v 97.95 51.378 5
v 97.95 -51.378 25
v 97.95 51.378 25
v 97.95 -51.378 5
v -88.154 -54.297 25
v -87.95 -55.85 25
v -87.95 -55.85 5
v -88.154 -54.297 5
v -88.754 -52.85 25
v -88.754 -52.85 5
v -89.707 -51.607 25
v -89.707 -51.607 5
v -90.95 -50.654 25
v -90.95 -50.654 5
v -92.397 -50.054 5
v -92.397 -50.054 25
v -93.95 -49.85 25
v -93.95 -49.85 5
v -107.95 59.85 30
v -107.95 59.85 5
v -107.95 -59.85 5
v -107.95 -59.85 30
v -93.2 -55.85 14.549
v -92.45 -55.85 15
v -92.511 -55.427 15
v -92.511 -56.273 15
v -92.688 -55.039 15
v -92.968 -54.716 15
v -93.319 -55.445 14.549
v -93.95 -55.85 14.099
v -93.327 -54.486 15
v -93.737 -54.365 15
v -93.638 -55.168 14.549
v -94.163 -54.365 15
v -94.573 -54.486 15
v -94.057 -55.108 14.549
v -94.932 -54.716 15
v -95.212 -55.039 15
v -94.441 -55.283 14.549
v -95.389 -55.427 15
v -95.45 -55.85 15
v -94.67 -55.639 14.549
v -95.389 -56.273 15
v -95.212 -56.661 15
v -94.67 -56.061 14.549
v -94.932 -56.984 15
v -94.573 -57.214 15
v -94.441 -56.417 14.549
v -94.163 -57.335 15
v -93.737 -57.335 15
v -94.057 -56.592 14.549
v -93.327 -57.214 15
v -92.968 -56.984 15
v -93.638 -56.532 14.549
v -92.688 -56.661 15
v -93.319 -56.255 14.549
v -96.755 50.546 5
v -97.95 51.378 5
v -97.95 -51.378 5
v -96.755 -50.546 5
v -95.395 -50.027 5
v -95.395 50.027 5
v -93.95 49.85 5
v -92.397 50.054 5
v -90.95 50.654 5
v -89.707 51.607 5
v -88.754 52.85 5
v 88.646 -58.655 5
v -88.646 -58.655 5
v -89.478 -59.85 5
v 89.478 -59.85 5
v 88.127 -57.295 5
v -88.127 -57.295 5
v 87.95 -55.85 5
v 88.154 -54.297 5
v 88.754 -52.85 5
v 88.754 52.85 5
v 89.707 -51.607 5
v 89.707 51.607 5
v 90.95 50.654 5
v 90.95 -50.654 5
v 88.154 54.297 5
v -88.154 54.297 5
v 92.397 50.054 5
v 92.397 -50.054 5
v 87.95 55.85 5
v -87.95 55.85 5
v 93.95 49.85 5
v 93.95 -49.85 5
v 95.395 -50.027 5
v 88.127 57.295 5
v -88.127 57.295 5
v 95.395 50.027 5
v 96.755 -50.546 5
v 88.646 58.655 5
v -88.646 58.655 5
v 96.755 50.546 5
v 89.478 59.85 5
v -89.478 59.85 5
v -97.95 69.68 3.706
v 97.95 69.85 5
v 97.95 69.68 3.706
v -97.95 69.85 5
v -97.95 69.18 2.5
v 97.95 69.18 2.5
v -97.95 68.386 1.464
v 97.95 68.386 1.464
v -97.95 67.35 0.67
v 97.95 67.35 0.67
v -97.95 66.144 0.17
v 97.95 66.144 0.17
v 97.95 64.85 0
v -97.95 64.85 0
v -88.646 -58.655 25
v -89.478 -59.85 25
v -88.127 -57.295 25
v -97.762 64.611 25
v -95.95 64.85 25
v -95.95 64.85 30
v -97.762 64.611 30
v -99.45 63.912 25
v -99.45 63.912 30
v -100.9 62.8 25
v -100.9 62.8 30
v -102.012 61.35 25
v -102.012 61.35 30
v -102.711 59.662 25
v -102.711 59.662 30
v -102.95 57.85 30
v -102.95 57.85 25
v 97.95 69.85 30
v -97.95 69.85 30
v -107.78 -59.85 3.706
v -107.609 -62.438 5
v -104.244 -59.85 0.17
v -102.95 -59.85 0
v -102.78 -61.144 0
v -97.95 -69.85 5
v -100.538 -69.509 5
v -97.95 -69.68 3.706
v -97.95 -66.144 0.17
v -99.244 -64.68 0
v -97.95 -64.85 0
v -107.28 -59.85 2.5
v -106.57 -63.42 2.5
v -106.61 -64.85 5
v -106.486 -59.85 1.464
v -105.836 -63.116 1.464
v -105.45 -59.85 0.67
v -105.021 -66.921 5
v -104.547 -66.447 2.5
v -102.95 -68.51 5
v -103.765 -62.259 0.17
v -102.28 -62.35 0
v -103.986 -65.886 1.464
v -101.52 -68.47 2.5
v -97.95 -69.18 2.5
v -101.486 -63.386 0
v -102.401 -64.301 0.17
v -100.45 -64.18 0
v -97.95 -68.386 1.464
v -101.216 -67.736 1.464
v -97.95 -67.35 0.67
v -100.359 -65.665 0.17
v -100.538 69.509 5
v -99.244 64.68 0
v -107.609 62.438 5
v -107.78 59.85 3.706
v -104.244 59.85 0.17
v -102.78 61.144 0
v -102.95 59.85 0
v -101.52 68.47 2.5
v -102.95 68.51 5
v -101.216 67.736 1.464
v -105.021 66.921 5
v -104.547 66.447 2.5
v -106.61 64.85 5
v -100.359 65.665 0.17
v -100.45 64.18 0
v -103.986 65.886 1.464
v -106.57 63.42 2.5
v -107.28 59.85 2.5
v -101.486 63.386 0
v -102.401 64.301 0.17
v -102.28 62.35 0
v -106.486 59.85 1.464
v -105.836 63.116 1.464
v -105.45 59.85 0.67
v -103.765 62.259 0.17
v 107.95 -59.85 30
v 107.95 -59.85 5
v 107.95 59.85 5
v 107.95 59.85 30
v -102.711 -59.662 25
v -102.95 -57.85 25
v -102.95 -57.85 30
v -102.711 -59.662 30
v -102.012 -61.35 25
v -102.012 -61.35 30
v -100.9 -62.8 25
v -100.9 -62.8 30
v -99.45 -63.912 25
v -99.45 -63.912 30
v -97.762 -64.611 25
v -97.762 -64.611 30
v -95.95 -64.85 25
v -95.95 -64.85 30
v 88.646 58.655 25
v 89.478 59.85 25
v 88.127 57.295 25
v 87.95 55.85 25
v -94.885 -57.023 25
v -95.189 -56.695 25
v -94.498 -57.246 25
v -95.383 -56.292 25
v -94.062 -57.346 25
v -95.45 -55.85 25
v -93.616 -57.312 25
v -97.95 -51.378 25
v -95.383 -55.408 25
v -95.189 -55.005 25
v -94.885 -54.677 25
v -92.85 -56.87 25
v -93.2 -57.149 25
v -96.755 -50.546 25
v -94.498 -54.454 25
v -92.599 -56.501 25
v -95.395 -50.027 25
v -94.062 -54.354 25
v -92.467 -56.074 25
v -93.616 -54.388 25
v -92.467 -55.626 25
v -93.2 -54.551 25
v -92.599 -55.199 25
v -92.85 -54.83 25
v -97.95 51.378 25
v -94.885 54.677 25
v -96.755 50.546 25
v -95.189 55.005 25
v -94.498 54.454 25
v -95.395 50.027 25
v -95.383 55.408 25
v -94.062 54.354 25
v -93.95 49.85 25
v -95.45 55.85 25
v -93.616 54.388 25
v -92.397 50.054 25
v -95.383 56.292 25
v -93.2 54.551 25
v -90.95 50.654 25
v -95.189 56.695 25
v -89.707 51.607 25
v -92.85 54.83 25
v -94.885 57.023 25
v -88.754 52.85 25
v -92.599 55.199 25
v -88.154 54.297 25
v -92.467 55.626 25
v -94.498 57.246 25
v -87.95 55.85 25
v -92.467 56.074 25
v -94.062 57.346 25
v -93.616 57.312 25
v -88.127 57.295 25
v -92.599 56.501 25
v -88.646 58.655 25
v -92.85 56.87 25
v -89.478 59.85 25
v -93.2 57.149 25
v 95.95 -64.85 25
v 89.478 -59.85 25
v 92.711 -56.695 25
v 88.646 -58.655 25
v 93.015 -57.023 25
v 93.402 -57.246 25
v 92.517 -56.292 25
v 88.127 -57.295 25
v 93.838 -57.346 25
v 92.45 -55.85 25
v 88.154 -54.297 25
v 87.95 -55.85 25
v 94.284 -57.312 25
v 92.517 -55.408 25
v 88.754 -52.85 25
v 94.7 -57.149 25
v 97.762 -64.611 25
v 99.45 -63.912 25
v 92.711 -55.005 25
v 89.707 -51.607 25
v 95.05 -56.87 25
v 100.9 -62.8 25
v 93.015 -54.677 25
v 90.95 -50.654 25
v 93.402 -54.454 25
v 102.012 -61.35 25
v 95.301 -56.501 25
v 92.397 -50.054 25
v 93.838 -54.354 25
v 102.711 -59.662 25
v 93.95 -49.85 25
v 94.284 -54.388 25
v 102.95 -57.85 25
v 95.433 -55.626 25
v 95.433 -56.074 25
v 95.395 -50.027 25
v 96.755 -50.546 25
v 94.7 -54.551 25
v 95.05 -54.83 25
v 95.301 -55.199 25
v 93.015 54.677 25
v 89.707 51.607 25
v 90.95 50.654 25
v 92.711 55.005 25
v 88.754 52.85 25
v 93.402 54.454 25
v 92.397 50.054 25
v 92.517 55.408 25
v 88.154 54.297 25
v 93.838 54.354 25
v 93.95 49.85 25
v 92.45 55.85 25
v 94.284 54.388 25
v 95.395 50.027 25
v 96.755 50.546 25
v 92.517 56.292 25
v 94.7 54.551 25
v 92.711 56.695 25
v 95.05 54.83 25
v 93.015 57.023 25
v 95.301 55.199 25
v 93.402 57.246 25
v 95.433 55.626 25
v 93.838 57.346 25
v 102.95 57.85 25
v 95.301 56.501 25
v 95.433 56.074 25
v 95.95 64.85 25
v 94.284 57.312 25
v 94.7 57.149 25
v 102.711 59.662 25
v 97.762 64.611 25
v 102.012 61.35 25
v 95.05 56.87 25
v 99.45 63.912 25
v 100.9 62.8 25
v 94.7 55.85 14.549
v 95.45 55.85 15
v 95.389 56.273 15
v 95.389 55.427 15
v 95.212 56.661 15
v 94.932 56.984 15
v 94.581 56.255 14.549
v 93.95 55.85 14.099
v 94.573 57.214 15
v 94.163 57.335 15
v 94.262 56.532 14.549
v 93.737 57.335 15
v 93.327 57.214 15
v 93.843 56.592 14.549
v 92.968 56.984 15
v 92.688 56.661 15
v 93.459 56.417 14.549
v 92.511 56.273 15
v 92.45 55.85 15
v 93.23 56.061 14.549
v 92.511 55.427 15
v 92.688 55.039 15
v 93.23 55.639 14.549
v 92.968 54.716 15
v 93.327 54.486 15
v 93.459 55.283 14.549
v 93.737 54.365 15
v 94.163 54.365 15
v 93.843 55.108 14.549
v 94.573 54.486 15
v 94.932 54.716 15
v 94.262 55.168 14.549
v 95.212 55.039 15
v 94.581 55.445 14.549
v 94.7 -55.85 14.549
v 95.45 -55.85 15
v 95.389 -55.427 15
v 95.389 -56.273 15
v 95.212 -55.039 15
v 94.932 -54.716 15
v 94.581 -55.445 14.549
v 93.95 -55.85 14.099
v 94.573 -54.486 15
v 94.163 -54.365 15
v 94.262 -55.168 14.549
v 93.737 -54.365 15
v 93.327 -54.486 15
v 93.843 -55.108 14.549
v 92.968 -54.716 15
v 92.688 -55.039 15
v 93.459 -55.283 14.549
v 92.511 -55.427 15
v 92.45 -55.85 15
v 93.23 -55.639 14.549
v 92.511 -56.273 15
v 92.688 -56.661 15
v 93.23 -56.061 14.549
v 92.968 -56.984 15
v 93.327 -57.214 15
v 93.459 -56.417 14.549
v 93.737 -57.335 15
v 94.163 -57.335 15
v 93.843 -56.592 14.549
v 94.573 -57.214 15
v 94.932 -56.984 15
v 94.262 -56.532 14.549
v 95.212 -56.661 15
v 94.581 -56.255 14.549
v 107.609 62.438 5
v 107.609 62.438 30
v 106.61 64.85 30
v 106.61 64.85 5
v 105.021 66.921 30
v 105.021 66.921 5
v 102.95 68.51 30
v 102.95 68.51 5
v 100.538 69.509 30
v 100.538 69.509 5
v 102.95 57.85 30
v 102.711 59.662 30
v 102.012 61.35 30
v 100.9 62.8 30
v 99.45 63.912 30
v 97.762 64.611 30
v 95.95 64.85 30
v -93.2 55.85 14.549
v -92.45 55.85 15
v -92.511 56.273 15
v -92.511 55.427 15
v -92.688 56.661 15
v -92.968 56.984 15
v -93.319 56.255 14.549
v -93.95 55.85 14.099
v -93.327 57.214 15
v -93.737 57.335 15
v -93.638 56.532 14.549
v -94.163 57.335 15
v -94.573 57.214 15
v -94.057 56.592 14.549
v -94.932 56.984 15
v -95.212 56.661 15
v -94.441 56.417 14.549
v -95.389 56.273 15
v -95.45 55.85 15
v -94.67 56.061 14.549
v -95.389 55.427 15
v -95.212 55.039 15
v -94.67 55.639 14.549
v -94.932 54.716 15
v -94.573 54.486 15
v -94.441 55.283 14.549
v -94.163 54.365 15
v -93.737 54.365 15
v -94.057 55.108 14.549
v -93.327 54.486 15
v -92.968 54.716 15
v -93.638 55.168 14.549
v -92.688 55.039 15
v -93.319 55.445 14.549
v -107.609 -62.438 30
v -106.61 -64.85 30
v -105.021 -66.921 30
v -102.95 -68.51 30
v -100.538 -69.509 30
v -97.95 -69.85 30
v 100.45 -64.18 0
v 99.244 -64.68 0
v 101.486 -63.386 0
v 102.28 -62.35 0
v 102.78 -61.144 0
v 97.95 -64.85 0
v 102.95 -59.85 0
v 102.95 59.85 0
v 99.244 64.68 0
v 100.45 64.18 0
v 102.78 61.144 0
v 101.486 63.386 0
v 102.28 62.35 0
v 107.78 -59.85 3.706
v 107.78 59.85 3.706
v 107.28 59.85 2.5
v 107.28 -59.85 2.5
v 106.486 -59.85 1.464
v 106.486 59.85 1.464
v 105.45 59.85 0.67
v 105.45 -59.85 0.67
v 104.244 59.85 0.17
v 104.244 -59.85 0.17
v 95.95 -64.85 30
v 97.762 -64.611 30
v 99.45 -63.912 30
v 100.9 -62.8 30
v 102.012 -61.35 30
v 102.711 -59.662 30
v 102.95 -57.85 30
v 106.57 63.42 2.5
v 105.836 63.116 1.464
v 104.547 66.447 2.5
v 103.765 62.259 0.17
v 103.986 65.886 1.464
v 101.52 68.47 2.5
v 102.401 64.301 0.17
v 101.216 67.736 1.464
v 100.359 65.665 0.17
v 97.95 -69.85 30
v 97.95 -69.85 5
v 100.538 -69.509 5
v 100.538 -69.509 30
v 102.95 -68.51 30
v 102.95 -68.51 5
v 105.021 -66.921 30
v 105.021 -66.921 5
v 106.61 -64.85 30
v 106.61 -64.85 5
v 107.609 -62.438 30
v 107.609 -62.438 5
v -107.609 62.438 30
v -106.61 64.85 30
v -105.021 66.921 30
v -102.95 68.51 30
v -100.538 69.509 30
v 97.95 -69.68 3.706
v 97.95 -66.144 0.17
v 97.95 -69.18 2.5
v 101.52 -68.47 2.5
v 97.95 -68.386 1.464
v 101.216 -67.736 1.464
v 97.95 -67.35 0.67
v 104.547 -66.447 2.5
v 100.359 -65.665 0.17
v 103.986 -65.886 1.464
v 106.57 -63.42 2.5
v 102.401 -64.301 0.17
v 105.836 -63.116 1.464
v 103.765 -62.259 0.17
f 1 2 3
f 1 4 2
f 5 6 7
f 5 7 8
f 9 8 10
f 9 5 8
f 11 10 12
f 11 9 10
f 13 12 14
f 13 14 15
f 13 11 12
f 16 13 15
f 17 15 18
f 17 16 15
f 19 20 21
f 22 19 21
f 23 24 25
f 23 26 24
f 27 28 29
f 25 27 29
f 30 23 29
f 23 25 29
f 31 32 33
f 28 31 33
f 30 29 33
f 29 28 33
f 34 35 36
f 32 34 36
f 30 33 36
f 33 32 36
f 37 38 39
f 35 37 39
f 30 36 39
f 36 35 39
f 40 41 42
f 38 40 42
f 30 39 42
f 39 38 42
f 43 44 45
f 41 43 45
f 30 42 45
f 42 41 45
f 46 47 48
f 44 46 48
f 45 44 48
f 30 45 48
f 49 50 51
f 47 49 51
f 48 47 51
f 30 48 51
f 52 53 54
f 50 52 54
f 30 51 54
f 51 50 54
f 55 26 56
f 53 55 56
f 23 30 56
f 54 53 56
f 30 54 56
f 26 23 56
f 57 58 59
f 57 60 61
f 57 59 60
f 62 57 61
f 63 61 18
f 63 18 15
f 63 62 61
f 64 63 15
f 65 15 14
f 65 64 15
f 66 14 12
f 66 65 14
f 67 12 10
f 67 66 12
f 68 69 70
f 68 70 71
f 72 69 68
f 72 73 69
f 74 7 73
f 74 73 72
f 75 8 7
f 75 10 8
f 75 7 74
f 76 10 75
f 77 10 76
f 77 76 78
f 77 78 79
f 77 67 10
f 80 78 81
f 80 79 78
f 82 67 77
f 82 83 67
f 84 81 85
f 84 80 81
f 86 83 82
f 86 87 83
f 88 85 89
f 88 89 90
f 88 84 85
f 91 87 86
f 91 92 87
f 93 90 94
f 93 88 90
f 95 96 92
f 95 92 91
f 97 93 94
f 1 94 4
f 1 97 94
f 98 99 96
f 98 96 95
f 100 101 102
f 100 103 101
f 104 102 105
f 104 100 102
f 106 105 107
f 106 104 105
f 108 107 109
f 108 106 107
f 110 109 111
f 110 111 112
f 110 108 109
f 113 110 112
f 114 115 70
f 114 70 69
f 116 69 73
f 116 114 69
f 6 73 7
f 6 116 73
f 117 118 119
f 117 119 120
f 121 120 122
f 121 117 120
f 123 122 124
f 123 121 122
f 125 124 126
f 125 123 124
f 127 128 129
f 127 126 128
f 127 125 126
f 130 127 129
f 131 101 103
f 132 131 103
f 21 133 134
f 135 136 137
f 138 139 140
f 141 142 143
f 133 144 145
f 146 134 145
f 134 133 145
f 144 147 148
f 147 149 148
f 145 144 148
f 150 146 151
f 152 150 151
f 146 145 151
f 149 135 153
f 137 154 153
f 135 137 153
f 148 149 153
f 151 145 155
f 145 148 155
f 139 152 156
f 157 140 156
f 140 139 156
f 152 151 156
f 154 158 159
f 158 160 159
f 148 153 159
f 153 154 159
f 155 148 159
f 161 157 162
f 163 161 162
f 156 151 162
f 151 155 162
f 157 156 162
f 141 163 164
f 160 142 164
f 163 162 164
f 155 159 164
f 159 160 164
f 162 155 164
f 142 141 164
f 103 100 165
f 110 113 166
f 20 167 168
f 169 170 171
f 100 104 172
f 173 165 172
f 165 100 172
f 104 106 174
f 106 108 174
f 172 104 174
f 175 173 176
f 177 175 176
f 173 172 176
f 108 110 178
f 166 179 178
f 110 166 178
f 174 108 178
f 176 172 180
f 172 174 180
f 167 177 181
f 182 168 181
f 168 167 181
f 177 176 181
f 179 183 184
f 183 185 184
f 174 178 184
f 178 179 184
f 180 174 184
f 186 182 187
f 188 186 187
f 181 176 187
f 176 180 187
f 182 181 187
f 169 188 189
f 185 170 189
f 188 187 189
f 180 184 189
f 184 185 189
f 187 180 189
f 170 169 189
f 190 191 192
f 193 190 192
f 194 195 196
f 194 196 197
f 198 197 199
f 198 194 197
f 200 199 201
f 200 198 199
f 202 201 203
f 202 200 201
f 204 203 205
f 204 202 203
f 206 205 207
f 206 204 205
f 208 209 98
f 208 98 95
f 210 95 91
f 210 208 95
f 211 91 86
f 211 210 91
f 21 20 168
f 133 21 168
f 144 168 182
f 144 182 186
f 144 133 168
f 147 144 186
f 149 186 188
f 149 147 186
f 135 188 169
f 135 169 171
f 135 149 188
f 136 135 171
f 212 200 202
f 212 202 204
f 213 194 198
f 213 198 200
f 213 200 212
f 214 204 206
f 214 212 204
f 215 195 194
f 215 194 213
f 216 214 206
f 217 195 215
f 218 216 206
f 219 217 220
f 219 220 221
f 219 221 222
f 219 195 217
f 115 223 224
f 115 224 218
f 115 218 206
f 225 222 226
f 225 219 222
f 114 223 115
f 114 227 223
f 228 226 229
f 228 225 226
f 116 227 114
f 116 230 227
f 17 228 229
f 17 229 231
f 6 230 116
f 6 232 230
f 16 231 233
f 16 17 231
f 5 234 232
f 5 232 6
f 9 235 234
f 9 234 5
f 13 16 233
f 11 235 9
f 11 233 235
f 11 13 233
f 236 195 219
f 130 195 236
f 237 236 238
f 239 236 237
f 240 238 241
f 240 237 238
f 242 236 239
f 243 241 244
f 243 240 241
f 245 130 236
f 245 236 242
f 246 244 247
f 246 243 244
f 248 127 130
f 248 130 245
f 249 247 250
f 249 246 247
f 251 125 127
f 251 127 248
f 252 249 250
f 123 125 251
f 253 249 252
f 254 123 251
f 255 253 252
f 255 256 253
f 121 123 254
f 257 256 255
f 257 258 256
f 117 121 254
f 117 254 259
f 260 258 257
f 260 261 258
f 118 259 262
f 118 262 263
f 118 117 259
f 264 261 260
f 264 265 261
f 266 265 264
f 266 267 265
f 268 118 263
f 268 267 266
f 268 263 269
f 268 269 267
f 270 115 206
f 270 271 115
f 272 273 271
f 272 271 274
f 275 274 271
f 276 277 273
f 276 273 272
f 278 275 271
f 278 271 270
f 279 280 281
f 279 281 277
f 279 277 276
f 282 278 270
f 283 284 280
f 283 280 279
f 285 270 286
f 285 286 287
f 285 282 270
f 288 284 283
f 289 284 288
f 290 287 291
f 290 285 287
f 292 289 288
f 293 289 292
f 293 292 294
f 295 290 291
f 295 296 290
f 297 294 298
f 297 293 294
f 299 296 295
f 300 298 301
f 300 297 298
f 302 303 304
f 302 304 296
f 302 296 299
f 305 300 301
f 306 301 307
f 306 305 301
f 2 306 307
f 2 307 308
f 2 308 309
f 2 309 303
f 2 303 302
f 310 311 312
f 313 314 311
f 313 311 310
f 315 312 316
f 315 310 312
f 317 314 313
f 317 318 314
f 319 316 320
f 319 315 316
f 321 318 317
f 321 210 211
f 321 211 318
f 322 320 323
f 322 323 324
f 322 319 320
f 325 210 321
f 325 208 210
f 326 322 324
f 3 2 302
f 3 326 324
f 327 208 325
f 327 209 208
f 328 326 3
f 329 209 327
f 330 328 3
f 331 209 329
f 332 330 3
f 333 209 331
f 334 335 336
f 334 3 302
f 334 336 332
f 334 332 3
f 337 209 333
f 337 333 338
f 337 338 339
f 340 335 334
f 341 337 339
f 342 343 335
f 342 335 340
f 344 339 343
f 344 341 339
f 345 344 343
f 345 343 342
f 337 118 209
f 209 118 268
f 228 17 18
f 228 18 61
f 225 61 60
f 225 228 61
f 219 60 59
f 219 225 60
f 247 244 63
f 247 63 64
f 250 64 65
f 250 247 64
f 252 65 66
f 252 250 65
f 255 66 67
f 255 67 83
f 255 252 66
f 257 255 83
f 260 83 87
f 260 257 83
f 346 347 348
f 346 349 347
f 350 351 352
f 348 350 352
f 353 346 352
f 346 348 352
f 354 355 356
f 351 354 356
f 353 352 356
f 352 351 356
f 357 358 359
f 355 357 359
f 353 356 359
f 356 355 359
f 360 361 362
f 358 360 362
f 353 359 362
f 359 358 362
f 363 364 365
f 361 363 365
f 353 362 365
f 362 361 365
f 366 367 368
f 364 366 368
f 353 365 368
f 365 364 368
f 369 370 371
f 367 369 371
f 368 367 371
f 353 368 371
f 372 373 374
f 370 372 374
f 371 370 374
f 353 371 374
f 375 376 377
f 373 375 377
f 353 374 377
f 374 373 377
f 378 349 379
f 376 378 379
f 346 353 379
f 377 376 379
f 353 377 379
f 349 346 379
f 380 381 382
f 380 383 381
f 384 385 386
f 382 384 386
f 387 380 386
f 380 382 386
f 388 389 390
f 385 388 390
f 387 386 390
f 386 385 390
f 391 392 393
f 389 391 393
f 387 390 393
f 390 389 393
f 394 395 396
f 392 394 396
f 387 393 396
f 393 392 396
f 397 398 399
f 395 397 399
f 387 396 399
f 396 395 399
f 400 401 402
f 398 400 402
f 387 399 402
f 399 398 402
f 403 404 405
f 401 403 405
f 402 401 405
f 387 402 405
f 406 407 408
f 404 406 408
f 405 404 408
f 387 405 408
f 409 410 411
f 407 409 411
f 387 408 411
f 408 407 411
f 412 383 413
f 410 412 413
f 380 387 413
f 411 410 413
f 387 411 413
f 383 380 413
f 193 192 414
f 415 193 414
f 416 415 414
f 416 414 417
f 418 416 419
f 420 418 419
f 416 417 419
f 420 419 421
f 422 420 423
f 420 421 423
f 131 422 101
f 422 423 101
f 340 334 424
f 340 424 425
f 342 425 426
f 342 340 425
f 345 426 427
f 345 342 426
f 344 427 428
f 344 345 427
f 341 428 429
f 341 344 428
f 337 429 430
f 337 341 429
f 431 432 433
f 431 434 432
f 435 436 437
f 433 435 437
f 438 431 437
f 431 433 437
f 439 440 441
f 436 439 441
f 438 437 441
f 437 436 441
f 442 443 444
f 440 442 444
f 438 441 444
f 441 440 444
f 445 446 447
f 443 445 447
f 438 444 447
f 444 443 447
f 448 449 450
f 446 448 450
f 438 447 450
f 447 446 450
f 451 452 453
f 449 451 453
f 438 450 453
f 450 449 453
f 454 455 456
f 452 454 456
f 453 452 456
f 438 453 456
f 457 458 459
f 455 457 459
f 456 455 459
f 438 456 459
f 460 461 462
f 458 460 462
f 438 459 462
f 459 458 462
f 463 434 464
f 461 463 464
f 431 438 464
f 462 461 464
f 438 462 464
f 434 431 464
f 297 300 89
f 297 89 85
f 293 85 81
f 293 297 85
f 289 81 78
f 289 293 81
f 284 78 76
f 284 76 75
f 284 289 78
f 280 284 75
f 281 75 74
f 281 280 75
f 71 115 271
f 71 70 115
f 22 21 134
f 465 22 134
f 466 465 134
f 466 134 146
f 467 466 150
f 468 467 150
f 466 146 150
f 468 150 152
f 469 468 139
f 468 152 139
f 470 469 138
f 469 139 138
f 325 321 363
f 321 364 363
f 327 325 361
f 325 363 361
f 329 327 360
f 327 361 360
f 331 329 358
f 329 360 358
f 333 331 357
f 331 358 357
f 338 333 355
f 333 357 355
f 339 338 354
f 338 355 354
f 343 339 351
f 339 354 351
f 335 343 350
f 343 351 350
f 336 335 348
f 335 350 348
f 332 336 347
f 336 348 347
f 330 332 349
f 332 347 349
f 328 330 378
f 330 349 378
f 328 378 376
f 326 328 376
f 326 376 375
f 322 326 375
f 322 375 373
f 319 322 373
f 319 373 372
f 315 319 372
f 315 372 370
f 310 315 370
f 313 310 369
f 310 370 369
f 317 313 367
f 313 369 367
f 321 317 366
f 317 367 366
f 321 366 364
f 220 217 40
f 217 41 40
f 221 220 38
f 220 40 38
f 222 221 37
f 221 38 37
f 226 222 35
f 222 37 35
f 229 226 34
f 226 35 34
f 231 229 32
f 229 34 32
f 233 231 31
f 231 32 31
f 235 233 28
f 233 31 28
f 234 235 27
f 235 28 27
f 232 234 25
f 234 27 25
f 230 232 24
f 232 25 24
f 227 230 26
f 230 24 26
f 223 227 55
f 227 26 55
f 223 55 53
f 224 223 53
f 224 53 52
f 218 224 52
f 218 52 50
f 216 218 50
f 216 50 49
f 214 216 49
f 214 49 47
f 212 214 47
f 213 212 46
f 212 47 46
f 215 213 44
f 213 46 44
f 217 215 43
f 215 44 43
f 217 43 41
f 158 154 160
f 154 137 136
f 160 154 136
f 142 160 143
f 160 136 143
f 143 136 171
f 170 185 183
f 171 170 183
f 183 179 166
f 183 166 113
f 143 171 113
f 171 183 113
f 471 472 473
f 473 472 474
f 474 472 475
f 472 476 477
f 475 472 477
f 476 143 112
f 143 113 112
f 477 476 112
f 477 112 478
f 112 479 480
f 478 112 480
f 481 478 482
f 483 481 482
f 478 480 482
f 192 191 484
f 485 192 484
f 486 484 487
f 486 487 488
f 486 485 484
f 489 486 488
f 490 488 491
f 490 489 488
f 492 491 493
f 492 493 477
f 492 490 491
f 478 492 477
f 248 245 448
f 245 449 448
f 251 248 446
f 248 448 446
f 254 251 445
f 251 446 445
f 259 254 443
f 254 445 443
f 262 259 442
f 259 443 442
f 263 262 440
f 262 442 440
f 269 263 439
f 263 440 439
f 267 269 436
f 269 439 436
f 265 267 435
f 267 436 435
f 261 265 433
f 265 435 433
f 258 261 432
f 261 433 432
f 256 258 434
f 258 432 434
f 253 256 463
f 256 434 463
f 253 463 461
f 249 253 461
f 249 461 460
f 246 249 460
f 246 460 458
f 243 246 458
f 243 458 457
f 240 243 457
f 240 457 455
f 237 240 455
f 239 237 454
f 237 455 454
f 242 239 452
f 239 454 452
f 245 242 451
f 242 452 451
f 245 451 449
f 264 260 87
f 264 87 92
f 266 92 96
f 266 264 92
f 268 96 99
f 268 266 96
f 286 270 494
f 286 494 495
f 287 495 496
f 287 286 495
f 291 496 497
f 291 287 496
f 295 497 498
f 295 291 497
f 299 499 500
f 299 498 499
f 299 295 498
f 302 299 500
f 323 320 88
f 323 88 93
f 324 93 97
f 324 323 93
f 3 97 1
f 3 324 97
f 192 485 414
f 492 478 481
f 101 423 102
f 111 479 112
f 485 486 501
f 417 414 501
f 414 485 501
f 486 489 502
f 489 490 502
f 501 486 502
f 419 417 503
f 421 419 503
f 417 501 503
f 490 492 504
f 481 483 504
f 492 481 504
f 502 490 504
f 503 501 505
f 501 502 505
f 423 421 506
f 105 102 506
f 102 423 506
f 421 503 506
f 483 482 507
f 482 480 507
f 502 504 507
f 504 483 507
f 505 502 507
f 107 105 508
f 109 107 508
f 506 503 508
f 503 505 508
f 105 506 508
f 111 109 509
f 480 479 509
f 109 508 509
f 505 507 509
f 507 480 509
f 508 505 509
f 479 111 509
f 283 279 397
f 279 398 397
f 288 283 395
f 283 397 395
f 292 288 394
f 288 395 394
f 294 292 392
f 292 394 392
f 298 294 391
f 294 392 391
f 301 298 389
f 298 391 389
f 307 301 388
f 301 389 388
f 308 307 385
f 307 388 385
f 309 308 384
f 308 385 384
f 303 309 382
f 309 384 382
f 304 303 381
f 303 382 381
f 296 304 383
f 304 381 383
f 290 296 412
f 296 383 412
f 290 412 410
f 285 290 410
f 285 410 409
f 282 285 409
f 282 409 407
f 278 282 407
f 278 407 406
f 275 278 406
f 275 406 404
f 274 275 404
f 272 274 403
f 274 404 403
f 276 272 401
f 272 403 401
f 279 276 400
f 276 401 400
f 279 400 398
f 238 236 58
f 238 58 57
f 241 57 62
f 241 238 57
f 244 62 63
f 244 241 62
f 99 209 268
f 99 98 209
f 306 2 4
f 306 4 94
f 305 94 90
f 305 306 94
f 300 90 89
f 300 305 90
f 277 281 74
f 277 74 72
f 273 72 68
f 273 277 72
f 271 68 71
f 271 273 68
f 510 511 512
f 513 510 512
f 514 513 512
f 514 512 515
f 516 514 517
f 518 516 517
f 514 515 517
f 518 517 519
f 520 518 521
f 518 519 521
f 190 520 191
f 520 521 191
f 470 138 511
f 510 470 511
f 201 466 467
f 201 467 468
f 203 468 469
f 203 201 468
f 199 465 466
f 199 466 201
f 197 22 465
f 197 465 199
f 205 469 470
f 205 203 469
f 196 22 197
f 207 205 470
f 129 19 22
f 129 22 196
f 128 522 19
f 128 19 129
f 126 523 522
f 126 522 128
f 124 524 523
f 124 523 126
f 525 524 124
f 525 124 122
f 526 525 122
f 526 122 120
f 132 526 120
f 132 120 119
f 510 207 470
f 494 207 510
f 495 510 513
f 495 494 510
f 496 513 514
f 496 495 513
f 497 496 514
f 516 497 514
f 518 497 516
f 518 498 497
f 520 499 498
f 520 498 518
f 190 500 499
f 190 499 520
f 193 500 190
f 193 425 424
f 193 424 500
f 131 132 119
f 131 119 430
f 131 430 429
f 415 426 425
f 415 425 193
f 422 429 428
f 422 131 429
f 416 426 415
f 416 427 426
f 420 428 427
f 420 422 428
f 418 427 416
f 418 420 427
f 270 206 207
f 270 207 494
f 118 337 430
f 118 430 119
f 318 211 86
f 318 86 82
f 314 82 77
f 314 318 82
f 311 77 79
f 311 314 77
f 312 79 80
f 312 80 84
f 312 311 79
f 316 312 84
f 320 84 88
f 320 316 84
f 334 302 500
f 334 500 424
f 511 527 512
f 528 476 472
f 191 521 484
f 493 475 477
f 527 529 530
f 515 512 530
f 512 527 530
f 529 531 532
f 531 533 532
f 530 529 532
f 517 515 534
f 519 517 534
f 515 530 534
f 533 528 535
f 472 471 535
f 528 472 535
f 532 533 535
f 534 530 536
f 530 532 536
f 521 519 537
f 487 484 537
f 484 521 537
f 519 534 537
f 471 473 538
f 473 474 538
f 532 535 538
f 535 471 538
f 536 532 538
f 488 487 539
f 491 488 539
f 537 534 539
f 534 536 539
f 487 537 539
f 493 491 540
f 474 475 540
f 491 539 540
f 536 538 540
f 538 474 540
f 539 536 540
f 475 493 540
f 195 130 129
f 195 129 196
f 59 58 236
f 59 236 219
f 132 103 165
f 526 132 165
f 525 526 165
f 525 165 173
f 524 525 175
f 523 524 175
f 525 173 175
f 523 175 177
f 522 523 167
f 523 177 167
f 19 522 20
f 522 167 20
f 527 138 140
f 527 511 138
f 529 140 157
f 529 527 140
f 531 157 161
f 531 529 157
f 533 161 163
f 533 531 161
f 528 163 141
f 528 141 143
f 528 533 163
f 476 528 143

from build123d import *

# Parameters (mm, degrees)
F1_DEPTH  = 30
F2_T      = 10
F5_DEPTH  = 25
F7_W      = 195.9
F7_H      = 119.7
F8_DEPTH  = 5
F9_DEPTH  = 20
F10_D     = 3
F10_DEPTH = 10
F10_TIP   = 0.9012909285
F11_R     = 5


# Not quite as in the source:
# - a shell that OpenCascade refuses in one call is made with other operations: the cavity is built on its own and cut out


with BuildPart() as f1:
    # F0 (on Top) → F1 (new body)
    with BuildSketch(Plane.XY):
        with BuildLine():
            Line((-97.95, -69.85), (97.95, -69.85))
            ThreePointArc((97.95, -69.85), (105.0210678119, -66.9210678119), (107.95, -59.85))
            Line((107.95, -59.85), (107.95, 59.85))
            ThreePointArc((107.95, 59.85), (105.0210678119, 66.9210678119), (97.95, 69.85))
            Line((97.95, 69.85), (-97.95, 69.85))
            ThreePointArc((-97.95, 69.85), (-105.0210678119, 66.9210678119), (-107.95, 59.85))
            Line((-107.95, 59.85), (-107.95, -59.85))
            ThreePointArc((-107.95, -59.85), (-105.0210678119, -66.9210678119), (-97.95, -69.85))
        make_face()
    extrude(amount=F1_DEPTH)

    # F2: shell of thickness 10, made by hand


with BuildPart() as f2_core1:
    # F2_t2: copy of F1
    add(f1.part)

    # the walls: a layer under each face that stays
    f2_faces = [f2_core1.faces().sort_by_distance(p)[0] for p in [
        (0, -69.85, 15),
        (107.95, 0, 15),
        (0, 69.85, 15),
        (-107.95, 0, 15),
        (0, 0, 0),
    ]]
    thicken(f2_faces, amount=-F2_T, mode=Mode.SUBTRACT)


with BuildPart() as f1_1:
    add(f1.part)

    # what is left inside the walls is the cavity
    f2_cavity = [f2_core1.part.solids().sort_by_distance(p)[0] for p in [
        (0, -19.95, 10.1),
    ]]
    add(f2_cavity, mode=Mode.SUBTRACT)

    # F4 (on offset) → F5 (cut)
    with BuildSketch(Plane.XY.offset(25)):
        with BuildLine():
            Line((-95.95, -64.85), (95.95, -64.85))
            ThreePointArc((95.95, -64.85), (100.8997474683, -62.7997474683), (102.95, -57.85))
            Line((102.95, -57.85), (102.95, 57.85))
            ThreePointArc((102.95, 57.85), (100.8997474683, 62.7997474683), (95.95, 64.85))
            Line((95.95, 64.85), (-95.95, 64.85))
            ThreePointArc((-95.95, 64.85), (-100.8997474683, 62.7997474683), (-102.95, 57.85))
            Line((-102.95, 57.85), (-102.95, -57.85))
            ThreePointArc((-102.95, -57.85), (-100.8997474683, -62.7997474683), (-95.95, -64.85))
        make_face()
    extrude(amount=F5_DEPTH, mode=Mode.SUBTRACT)

    # F7 (on face) → F8 (cut)
    with BuildSketch(Plane.XY.offset(10)):
        Rectangle(F7_W, F7_H)
    extrude(amount=-F8_DEPTH, mode=Mode.SUBTRACT)

    # F6 (on face) → F9 (join, through all)
    with BuildSketch(Plane.XY.offset(25)):
        with BuildLine():
            Line((-93.95, 49.85), (-93.95, 55.85))
            Line((-93.95, 55.85), (-87.95, 55.85))
            ThreePointArc((-87.95, 55.85), (-88.3449658462, 57.9909325386), (-89.477864045, 59.85))
            Line((-89.477864045, 59.85), (-97.95, 59.85))
            Line((-97.95, 59.85), (-97.95, 51.377864045))
            ThreePointArc((-97.95, 51.377864045), (-96.0909325386, 50.2449658462), (-93.95, 49.85))
        make_face()
        with BuildLine():
            Line((-87.95, 55.85), (-93.95, 55.85))
            Line((-93.95, 55.85), (-93.95, 49.85))
            ThreePointArc((-93.95, 49.85), (-89.7073593129, 51.6073593129), (-87.95, 55.85))
        make_face()
        with BuildLine():
            Line((93.95, 55.85), (87.95, 55.85))
            ThreePointArc((87.95, 55.85), (89.7073593129, 51.6073593129), (93.95, 49.85))
            Line((93.95, 49.85), (93.95, 55.85))
        make_face()
        with BuildLine():
            ThreePointArc((89.477864045, 59.85), (88.3449658462, 57.9909325386), (87.95, 55.85))
            Line((87.95, 55.85), (93.95, 55.85))
            Line((93.95, 55.85), (93.95, 49.85))
            ThreePointArc((93.95, 49.85), (96.0909325386, 50.2449658462), (97.95, 51.377864045))
            Line((97.95, 51.377864045), (97.95, 59.85))
            Line((97.95, 59.85), (89.477864045, 59.85))
        make_face()
        with BuildLine():
            Line((93.95, -55.85), (93.95, -49.85))
            ThreePointArc((93.95, -49.85), (89.7073593129, -51.6073593129), (87.95, -55.85))
            Line((87.95, -55.85), (93.95, -55.85))
        make_face()
        with BuildLine():
            ThreePointArc((97.95, -51.377864045), (96.0909325386, -50.2449658462), (93.95, -49.85))
            Line((93.95, -49.85), (93.95, -55.85))
            Line((93.95, -55.85), (87.95, -55.85))
            ThreePointArc((87.95, -55.85), (88.3449658462, -57.9909325386), (89.477864045, -59.85))
            Line((89.477864045, -59.85), (97.95, -59.85))
            Line((97.95, -59.85), (97.95, -51.377864045))
        make_face()
        with BuildLine():
            Line((-93.95, -55.85), (-93.95, -49.85))
            ThreePointArc((-93.95, -49.85), (-96.0909325386, -50.2449658462), (-97.95, -51.377864045))
            Line((-97.95, -51.377864045), (-97.95, -59.85))
            Line((-97.95, -59.85), (-89.477864045, -59.85))
            ThreePointArc((-89.477864045, -59.85), (-88.3449658462, -57.9909325386), (-87.95, -55.85))
            Line((-87.95, -55.85), (-93.95, -55.85))
        make_face()
        with BuildLine():
            ThreePointArc((-87.95, -55.85), (-89.7073593129, -51.6073593129), (-93.95, -49.85))
            Line((-93.95, -49.85), (-93.95, -55.85))
            Line((-93.95, -55.85), (-87.95, -55.85))
        make_face()
    extrude(amount=-F9_DEPTH)

    # F10
    with Locations(Plane.XY.offset(25)):
        with Locations((-93.95, 55.85), (-93.95, -55.85), (93.95, -55.85), (93.95, 55.85)):
            Hole(F10_D / 2, depth=F10_DEPTH)
            with Locations((0, 0, -(F10_DEPTH + F10_TIP / 2))):  # 118° drill point
                Cone(0, F10_D / 2, F10_TIP, mode=Mode.SUBTRACT)

    # F11
    f11_edges = [f1_1.edges().sort_by_distance(p)[0] for p in [
        (-107.95, 0, 0),
    ]]
    fillet(f11_edges, radius=F11_R)


solid = f1_1.part
